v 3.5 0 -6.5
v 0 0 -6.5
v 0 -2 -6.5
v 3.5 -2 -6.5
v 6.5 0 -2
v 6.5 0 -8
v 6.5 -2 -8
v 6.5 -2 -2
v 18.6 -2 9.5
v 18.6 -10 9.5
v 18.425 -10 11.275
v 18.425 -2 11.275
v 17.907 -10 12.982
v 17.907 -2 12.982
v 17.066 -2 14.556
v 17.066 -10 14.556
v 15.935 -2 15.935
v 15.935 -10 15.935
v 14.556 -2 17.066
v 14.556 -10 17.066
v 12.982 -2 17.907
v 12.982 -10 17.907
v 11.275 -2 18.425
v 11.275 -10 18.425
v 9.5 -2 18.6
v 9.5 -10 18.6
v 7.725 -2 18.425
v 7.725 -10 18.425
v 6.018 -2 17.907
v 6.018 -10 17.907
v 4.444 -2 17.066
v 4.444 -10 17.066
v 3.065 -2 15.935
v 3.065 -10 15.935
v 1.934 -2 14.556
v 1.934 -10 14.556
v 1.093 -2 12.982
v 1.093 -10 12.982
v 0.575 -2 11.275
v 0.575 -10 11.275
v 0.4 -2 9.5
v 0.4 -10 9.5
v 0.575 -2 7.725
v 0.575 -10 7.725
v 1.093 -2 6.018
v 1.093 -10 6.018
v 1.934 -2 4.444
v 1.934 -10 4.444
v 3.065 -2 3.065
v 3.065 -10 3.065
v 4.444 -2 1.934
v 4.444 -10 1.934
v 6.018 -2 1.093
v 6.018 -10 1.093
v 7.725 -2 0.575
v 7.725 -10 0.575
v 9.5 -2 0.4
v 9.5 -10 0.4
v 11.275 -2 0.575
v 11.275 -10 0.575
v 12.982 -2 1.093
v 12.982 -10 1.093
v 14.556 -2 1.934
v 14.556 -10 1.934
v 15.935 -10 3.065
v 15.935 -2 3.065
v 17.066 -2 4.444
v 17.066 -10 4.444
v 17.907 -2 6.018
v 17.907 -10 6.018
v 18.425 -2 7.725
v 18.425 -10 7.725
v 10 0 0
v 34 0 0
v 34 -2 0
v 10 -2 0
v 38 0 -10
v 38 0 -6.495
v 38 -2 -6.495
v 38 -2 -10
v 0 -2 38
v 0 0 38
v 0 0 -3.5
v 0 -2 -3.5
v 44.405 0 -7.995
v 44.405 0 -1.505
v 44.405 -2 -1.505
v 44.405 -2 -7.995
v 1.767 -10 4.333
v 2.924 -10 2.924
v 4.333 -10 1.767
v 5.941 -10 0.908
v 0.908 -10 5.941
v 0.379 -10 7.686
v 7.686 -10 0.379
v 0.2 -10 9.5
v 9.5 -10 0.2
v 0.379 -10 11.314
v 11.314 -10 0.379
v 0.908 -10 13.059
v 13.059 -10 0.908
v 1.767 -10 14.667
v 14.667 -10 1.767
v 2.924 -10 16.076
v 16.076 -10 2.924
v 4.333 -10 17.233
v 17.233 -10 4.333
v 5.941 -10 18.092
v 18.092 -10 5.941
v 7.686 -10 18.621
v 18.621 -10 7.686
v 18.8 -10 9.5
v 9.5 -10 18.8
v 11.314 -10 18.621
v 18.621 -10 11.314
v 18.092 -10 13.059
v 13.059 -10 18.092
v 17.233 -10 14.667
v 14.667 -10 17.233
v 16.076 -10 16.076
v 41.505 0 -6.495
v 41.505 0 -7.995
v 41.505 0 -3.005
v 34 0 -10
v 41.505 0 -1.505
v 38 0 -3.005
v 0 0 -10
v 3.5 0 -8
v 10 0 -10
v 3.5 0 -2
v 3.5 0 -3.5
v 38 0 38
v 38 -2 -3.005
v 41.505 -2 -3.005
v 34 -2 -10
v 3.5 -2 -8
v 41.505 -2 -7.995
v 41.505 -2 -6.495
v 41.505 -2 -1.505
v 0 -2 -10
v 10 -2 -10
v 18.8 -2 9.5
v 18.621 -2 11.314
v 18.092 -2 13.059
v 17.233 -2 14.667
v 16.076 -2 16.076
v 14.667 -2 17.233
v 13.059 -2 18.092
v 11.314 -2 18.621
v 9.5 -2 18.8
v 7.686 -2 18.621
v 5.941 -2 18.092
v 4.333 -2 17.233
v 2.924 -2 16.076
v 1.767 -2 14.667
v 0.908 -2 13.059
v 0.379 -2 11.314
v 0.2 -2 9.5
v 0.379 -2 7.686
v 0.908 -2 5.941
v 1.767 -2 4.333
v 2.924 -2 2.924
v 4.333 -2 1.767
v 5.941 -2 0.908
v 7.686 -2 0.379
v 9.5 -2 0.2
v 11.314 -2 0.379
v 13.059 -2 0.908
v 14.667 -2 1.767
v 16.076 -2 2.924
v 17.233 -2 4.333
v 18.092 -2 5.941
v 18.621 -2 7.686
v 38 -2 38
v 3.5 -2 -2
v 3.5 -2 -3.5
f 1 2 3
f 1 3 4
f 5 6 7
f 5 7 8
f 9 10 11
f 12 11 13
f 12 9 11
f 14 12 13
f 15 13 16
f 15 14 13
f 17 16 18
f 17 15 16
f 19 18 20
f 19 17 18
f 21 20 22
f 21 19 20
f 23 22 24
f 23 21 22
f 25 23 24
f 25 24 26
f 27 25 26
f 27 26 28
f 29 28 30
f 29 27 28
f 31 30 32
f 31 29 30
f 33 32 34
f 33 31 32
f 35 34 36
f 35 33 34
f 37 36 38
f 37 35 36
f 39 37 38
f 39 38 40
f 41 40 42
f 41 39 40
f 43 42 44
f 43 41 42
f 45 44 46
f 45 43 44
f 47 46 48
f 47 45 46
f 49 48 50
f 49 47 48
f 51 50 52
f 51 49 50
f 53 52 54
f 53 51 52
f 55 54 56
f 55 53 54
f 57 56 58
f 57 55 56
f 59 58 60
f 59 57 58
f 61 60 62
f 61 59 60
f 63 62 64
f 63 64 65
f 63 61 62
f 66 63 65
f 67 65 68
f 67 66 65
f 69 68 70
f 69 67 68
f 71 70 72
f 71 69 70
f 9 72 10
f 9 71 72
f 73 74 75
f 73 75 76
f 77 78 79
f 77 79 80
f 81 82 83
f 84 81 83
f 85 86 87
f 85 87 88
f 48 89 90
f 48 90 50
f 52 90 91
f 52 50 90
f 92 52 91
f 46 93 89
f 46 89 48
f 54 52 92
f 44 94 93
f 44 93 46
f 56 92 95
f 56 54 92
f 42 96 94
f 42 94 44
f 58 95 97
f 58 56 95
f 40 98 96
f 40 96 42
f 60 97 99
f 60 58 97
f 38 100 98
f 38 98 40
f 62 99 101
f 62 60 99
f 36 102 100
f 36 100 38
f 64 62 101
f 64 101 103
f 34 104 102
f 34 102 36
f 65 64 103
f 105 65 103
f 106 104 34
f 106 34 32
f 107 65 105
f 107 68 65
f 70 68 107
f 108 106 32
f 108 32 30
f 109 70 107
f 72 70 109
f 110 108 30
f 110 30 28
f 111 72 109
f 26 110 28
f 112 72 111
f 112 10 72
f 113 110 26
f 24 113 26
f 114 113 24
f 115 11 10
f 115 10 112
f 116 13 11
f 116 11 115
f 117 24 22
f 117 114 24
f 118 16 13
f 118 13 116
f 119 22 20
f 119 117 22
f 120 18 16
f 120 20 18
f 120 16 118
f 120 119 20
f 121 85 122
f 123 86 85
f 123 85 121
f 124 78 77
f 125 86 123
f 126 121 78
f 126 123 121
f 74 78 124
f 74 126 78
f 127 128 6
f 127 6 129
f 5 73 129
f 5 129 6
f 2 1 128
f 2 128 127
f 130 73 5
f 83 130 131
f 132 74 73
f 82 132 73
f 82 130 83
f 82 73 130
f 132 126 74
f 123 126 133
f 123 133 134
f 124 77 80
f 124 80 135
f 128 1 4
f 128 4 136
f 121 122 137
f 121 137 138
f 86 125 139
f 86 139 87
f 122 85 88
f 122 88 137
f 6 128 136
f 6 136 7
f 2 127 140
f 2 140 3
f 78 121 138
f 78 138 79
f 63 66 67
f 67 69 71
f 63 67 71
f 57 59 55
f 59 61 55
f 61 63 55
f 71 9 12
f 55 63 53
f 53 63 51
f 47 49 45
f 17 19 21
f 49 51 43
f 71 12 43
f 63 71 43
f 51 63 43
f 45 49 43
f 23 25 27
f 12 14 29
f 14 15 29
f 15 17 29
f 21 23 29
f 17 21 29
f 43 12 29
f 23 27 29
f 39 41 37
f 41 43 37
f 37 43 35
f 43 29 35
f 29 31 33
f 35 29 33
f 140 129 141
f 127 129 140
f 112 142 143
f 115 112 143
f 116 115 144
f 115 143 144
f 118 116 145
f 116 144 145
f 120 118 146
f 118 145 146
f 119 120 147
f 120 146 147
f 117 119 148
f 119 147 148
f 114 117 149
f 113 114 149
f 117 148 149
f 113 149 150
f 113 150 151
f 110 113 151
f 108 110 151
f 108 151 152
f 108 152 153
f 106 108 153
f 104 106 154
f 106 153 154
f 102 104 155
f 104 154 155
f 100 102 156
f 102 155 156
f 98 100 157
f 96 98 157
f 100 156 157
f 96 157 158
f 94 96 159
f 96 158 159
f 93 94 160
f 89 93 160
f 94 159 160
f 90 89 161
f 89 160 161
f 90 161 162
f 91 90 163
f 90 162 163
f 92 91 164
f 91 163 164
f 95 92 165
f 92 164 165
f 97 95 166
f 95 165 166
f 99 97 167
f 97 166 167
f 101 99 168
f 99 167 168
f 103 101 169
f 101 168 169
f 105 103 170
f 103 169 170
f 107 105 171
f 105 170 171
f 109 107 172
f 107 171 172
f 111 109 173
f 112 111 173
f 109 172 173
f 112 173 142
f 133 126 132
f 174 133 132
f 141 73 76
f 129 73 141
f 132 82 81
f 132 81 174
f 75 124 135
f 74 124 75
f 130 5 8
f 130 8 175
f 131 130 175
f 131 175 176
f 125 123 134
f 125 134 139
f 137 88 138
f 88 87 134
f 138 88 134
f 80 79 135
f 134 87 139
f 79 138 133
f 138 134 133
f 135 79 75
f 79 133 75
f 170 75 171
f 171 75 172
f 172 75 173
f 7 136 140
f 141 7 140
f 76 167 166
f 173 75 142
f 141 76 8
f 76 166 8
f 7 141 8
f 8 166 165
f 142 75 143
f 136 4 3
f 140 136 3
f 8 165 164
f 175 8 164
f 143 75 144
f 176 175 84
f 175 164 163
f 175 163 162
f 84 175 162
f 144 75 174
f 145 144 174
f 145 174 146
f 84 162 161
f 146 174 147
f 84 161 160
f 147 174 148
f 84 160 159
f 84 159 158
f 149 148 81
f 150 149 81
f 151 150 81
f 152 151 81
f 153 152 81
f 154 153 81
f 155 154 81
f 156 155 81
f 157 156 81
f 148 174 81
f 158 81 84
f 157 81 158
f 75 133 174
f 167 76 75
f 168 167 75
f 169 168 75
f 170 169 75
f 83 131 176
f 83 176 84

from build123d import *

# Parameters (mm, degrees)
PAD_DEPTH     = 2
SKETCH001_R   = 9.3
SKETCH001_R_2 = 9.1
PAD001_DEPTH  = 8


with BuildPart() as part:
    # Sketch → Pad (new body)
    with BuildSketch(Plane.XZ):
        Polygon((10, 0), (10, -10), (0, -10), (0, -6.5), (3.5, -6.5), (3.5, -8), (6.5, -8), (6.5, -2), (3.5, -2), (3.5, -3.5), (0, -3.5), (0, 0), (0, 38), (38, 38), (38, 0.5), (38, -3.005), (41.505, -3.005), (41.505, -1.505), (44.405, -1.505), (44.405, -7.995), (41.505, -7.995), (41.505, -6.495), (38, -6.495), (38, -10), (34, -10), (34, 0), align=None)
    extrude(amount=PAD_DEPTH)

    # Sketch001 (on Face28 of Pad) → Pad001 (join)
    with BuildSketch(Plane.XZ.offset(2)):
        with Locations((9.5, 9.5)):
            Circle(SKETCH001_R)
        with Locations((9.5, 9.5)):
            Circle(SKETCH001_R_2, mode=Mode.SUBTRACT)
    extrude(amount=PAD001_DEPTH)


solid = part.part
